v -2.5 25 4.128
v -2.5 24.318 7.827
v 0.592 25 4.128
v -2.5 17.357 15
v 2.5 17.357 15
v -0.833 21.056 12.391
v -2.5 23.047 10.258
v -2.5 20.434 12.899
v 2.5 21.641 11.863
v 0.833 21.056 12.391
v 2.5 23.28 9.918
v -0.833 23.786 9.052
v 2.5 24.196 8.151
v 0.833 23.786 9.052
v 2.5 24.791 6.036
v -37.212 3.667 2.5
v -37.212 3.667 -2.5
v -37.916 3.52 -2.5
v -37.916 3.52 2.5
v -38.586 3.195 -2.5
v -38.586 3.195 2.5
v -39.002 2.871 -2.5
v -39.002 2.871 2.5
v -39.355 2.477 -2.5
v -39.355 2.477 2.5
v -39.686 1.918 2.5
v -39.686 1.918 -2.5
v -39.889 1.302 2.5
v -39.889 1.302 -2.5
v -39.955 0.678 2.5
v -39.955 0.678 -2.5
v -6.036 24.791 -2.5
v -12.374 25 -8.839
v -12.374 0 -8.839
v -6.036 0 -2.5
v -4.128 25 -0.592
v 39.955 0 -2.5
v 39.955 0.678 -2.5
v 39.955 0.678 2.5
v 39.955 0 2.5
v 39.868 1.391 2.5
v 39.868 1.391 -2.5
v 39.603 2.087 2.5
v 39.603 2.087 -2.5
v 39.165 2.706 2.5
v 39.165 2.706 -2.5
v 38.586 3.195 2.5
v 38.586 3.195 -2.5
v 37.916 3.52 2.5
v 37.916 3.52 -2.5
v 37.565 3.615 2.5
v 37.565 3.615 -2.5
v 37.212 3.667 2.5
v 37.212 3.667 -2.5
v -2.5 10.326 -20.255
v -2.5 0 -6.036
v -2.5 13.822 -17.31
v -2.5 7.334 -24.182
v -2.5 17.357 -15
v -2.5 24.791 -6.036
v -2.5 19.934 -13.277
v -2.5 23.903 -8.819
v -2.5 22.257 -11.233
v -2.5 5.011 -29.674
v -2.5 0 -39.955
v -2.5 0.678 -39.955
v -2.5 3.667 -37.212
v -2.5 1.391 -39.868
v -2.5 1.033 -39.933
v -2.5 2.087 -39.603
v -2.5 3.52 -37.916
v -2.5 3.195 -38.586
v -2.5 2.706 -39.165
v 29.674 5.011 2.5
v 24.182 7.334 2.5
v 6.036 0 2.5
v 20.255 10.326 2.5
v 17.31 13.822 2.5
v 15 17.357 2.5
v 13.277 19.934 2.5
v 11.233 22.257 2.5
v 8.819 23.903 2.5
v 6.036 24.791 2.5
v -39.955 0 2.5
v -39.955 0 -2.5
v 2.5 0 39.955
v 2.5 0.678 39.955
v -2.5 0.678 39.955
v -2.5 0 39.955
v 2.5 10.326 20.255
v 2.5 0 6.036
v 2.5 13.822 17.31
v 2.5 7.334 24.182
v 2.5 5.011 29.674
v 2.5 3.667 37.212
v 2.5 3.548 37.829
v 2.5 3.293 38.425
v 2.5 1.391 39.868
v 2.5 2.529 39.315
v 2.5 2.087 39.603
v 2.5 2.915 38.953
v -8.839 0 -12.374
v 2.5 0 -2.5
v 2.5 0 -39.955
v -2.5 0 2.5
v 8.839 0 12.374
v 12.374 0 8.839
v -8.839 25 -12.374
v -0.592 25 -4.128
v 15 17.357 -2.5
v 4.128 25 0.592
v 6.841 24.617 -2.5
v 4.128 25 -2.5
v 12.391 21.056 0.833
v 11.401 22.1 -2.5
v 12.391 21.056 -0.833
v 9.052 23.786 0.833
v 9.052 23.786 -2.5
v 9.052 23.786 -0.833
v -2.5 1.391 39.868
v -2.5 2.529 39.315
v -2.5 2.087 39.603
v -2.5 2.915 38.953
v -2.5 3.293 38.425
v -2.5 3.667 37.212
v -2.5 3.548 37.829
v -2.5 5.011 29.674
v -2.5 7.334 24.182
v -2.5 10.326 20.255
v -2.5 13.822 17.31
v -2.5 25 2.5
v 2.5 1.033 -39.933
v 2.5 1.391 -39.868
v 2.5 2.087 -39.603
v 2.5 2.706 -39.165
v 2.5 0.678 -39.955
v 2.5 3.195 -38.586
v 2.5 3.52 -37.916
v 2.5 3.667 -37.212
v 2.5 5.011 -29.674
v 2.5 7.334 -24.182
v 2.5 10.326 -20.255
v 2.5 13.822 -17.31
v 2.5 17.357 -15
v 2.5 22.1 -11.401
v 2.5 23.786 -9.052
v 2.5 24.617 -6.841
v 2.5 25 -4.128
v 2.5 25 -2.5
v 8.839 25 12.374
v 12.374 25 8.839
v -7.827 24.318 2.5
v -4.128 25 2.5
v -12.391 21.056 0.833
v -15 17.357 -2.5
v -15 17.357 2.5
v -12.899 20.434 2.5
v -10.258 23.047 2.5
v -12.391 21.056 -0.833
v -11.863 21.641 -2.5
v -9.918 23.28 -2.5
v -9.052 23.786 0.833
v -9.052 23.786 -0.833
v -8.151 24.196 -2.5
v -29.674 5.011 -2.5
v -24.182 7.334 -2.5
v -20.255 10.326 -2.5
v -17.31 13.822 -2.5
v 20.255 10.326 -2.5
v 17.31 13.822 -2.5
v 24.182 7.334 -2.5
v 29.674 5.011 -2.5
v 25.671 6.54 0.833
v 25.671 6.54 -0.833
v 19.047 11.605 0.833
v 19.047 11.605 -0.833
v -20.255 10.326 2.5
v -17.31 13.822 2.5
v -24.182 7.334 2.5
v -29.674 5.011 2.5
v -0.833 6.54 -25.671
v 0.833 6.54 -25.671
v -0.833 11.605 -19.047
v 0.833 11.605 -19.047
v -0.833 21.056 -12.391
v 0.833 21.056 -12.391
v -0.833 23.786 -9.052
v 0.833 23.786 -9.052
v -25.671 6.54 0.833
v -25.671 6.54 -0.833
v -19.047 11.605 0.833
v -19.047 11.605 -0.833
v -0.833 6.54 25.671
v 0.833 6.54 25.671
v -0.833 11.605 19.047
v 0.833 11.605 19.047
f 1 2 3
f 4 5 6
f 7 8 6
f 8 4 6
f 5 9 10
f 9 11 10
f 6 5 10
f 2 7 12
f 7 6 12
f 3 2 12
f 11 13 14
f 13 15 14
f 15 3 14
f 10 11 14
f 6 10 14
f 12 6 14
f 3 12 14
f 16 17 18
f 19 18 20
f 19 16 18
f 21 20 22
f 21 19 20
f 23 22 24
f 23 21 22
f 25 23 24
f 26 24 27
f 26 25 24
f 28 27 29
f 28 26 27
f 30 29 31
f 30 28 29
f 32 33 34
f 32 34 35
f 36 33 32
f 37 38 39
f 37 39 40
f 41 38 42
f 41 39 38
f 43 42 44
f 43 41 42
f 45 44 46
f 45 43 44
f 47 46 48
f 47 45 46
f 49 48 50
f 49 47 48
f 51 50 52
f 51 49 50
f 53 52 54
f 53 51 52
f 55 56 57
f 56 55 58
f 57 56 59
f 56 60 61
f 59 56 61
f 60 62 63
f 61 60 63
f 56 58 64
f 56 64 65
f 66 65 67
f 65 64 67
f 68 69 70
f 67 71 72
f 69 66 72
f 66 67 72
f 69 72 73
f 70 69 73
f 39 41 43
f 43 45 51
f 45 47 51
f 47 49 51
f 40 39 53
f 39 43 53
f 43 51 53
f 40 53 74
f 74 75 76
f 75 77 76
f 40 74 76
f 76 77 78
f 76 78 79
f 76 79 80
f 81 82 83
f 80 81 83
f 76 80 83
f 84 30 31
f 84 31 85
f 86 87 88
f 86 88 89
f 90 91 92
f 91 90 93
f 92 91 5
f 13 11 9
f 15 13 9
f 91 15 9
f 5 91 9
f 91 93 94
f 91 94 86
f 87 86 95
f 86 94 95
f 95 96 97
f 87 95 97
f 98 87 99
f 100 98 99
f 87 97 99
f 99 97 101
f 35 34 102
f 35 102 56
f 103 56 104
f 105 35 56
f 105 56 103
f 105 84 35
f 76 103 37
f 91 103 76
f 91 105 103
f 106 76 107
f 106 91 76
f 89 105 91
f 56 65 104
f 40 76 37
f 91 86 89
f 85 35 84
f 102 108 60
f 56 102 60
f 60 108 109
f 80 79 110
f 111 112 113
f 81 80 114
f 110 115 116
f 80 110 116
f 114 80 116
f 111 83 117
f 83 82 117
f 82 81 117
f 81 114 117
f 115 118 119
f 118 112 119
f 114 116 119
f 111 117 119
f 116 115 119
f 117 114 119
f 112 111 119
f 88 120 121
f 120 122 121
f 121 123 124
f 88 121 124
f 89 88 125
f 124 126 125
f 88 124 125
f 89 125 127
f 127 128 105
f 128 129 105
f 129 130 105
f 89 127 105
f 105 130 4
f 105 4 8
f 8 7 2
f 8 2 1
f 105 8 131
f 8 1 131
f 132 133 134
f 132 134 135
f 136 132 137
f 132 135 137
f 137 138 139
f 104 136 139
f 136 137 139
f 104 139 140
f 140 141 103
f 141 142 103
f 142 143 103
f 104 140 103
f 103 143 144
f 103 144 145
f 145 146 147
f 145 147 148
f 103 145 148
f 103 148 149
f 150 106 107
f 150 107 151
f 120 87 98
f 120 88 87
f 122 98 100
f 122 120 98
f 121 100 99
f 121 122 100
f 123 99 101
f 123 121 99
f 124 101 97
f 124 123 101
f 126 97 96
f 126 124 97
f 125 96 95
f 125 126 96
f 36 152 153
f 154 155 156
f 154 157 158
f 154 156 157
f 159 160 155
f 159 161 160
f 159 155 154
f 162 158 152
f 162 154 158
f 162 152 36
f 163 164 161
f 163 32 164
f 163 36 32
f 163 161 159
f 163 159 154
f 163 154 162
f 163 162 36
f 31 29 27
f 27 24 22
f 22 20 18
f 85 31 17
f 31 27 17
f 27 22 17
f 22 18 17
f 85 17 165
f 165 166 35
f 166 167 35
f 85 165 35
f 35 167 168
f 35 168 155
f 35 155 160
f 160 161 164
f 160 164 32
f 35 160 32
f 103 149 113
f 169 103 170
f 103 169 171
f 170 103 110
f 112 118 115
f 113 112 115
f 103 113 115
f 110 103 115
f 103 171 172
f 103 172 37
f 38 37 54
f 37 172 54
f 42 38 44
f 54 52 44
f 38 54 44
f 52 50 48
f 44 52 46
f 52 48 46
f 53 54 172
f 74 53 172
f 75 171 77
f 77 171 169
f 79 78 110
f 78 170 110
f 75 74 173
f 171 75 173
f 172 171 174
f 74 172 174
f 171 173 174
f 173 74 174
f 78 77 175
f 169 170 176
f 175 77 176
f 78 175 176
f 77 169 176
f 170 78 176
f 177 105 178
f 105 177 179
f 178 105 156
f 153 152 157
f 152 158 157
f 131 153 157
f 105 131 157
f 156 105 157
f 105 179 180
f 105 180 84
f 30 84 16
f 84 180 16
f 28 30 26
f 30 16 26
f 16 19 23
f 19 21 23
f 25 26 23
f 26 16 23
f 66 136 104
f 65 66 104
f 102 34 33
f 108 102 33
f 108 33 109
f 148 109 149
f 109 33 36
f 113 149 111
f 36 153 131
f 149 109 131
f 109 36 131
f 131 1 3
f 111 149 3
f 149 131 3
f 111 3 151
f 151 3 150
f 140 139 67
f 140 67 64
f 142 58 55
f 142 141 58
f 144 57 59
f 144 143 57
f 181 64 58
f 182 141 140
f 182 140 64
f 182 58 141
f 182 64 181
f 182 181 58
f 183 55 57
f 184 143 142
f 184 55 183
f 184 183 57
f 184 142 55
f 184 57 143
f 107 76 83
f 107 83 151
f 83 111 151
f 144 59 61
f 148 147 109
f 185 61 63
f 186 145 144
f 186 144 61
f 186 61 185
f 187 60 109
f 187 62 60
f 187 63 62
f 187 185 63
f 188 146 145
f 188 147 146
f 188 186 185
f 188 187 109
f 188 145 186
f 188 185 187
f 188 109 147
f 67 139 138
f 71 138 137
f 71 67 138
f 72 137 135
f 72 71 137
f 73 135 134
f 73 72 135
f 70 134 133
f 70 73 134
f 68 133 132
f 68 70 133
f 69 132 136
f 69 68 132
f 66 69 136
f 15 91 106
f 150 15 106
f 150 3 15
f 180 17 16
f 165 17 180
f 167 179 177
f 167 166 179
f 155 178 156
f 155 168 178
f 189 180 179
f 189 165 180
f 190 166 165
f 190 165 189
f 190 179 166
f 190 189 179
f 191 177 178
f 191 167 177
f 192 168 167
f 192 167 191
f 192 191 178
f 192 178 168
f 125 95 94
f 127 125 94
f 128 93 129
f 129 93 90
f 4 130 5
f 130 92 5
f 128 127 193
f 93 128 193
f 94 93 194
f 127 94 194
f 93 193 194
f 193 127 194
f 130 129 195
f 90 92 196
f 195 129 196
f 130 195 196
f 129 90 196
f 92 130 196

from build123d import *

# Parameters (mm, degrees)
SKETCH3_W           = 30
SKETCH3_H           = 5
SKETCH3_W_2         = 5
SKETCH3_H_2         = 30
BOSS_EXTRUDE2_DEPTH = 25
CUT_EXTRUDE2_DEPTH  = 35.003676272
BOSS_EXTRUDE3_DEPTH = 5
SKETCH9_W           = 12.5
SKETCH9_H           = 5
CUT_EXTRUDE3_DEPTH  = 50.460787365
CIRPATTERN9_COUNT   = 4
SKETCH11_W          = 30
SKETCH11_H          = 25
BOSS_EXTRUDE5_DEPTH = 2.5
FILLET1_R           = 3


with BuildPart() as part:
    # Sketch3 → Boss-Extrude2 (new body)
    with BuildSketch(Plane(origin=(0, 0, 0), x_dir=(1, 0, 0), z_dir=(0, 1, 0))):
        Rectangle(SKETCH3_W, SKETCH3_H)
        Rectangle(SKETCH3_W_2, SKETCH3_H_2)
    extrude(amount=BOSS_EXTRUDE2_DEPTH)

    # Sketch4 → Cut-Extrude2 (cut, symmetric)
    with BuildSketch(Plane(origin=(2.5, 0, 0), x_dir=(0, 0, -1), z_dir=(1, 0, 0))):
        with BuildLine():
            Line((-15, 25), (-15, 17.357377201))
            add(Edge.make_bspline(
                [(-15, 17.357377201), (-12.472140197, 21.356054213), (-10.128526377, 24.727998236), (-4.127581327, 25)],
                knots=[0.577139171, 0.577139171, 0.577139171, 0.577139171, 0.966590179, 0.966590179, 0.966590179, 0.966590179], degree=3))
            Line((-4.127581327, 25), (-15, 25))
        make_face()
    cut_extrude2 = extrude(amount=CUT_EXTRUDE2_DEPTH, both=True, mode=Mode.SUBTRACT)

    # Sketch5 → Boss-Extrude3 (add)
    with BuildSketch(Plane(origin=(2.5, 0, 0), x_dir=(0, 0, -1), z_dir=(1, 0, 0))):
        with BuildLine():
            Line((-39.95459265, 0), (-15, 0))
            Line((-15, 0), (-15, 17.357377201))
            add(Edge.make_bspline(
                [(-39.95459265, 3.5), (-22.896848779, 4.129478661), (-18.746111538, 11.431617363), (-15, 17.357377201)],
                knots=[0, 0, 0, 0, 0.577139171, 0.577139171, 0.577139171, 0.577139171], degree=3))
            Line((-39.95459265, 3.5), (-39.95459265, 0))
        make_face()
    boss_extrude3 = extrude(amount=-BOSS_EXTRUDE3_DEPTH)

    # Mirror1: Boss-Extrude3 across plane
    add(boss_extrude3.mirror(Plane.XY))

    # Mirror2: Cut-Extrude2 across plane
    add(cut_extrude2.mirror(Plane.XY), mode=Mode.SUBTRACT)

    # Sketch9 → Cut-Extrude3 (cut, through all)
    with BuildSketch(Plane(origin=(0, 25, 0), x_dir=(1, 0, 0), z_dir=(0, 1, 0))):
        with Locations((-8.75, 0)):
            Rectangle(SKETCH9_W, SKETCH9_H)
        with Locations((8.75, 0)):
            Rectangle(SKETCH9_W, SKETCH9_H)
    extrude(amount=-CUT_EXTRUDE3_DEPTH, mode=Mode.SUBTRACT)


with BuildPart() as cirpattern9_1:
    # CirPattern9: pattern copy
    add(part.part.rotate(Axis((0, 0, 0), (0, 1, 0)), 1 * 360 / CIRPATTERN9_COUNT))


with BuildPart() as cirpattern9_2:
    # CirPattern9: pattern copy
    add(part.part.rotate(Axis((0, 0, 0), (0, 1, 0)), 2 * 360 / CIRPATTERN9_COUNT))


with BuildPart() as cirpattern9_3:
    # CirPattern9: pattern copy
    add(part.part.rotate(Axis((0, 0, 0), (0, 1, 0)), 3 * 360 / CIRPATTERN9_COUNT))


with BuildPart() as part_1:
    add(part.part)

    add(cirpattern9_1.part)  # Boss-Extrude5 merges CirPattern9_1

    add(cirpattern9_2.part)  # Boss-Extrude5 merges CirPattern9_2

    add(cirpattern9_3.part)  # Boss-Extrude5 merges CirPattern9_3
    # Sketch11 → Boss-Extrude5 (add, symmetric)
    with BuildSketch(Plane(origin=(0, 0, 0), x_dir=(0.7071067811865489, 0, 0.7071067811865462), z_dir=(-0.7071067811865462, 0, 0.7071067811865489))):
        with Locations((0, 12.5)):
            Rectangle(SKETCH11_W, SKETCH11_H)
    extrude(amount=BOSS_EXTRUDE5_DEPTH, both=True)

    # Fillet1
    fillet1_edges = [part_1.edges().sort_by_distance(p)[0] for p in [
        (0, 3.5, 39.95459265),
        (0, 3.5, -39.95459265),
        (39.95459265, 3.5, 0),
        (-39.95459265, 3.5, 0),
    ]]
    fillet(fillet1_edges, radius=FILLET1_R)


solid = part_1.part
